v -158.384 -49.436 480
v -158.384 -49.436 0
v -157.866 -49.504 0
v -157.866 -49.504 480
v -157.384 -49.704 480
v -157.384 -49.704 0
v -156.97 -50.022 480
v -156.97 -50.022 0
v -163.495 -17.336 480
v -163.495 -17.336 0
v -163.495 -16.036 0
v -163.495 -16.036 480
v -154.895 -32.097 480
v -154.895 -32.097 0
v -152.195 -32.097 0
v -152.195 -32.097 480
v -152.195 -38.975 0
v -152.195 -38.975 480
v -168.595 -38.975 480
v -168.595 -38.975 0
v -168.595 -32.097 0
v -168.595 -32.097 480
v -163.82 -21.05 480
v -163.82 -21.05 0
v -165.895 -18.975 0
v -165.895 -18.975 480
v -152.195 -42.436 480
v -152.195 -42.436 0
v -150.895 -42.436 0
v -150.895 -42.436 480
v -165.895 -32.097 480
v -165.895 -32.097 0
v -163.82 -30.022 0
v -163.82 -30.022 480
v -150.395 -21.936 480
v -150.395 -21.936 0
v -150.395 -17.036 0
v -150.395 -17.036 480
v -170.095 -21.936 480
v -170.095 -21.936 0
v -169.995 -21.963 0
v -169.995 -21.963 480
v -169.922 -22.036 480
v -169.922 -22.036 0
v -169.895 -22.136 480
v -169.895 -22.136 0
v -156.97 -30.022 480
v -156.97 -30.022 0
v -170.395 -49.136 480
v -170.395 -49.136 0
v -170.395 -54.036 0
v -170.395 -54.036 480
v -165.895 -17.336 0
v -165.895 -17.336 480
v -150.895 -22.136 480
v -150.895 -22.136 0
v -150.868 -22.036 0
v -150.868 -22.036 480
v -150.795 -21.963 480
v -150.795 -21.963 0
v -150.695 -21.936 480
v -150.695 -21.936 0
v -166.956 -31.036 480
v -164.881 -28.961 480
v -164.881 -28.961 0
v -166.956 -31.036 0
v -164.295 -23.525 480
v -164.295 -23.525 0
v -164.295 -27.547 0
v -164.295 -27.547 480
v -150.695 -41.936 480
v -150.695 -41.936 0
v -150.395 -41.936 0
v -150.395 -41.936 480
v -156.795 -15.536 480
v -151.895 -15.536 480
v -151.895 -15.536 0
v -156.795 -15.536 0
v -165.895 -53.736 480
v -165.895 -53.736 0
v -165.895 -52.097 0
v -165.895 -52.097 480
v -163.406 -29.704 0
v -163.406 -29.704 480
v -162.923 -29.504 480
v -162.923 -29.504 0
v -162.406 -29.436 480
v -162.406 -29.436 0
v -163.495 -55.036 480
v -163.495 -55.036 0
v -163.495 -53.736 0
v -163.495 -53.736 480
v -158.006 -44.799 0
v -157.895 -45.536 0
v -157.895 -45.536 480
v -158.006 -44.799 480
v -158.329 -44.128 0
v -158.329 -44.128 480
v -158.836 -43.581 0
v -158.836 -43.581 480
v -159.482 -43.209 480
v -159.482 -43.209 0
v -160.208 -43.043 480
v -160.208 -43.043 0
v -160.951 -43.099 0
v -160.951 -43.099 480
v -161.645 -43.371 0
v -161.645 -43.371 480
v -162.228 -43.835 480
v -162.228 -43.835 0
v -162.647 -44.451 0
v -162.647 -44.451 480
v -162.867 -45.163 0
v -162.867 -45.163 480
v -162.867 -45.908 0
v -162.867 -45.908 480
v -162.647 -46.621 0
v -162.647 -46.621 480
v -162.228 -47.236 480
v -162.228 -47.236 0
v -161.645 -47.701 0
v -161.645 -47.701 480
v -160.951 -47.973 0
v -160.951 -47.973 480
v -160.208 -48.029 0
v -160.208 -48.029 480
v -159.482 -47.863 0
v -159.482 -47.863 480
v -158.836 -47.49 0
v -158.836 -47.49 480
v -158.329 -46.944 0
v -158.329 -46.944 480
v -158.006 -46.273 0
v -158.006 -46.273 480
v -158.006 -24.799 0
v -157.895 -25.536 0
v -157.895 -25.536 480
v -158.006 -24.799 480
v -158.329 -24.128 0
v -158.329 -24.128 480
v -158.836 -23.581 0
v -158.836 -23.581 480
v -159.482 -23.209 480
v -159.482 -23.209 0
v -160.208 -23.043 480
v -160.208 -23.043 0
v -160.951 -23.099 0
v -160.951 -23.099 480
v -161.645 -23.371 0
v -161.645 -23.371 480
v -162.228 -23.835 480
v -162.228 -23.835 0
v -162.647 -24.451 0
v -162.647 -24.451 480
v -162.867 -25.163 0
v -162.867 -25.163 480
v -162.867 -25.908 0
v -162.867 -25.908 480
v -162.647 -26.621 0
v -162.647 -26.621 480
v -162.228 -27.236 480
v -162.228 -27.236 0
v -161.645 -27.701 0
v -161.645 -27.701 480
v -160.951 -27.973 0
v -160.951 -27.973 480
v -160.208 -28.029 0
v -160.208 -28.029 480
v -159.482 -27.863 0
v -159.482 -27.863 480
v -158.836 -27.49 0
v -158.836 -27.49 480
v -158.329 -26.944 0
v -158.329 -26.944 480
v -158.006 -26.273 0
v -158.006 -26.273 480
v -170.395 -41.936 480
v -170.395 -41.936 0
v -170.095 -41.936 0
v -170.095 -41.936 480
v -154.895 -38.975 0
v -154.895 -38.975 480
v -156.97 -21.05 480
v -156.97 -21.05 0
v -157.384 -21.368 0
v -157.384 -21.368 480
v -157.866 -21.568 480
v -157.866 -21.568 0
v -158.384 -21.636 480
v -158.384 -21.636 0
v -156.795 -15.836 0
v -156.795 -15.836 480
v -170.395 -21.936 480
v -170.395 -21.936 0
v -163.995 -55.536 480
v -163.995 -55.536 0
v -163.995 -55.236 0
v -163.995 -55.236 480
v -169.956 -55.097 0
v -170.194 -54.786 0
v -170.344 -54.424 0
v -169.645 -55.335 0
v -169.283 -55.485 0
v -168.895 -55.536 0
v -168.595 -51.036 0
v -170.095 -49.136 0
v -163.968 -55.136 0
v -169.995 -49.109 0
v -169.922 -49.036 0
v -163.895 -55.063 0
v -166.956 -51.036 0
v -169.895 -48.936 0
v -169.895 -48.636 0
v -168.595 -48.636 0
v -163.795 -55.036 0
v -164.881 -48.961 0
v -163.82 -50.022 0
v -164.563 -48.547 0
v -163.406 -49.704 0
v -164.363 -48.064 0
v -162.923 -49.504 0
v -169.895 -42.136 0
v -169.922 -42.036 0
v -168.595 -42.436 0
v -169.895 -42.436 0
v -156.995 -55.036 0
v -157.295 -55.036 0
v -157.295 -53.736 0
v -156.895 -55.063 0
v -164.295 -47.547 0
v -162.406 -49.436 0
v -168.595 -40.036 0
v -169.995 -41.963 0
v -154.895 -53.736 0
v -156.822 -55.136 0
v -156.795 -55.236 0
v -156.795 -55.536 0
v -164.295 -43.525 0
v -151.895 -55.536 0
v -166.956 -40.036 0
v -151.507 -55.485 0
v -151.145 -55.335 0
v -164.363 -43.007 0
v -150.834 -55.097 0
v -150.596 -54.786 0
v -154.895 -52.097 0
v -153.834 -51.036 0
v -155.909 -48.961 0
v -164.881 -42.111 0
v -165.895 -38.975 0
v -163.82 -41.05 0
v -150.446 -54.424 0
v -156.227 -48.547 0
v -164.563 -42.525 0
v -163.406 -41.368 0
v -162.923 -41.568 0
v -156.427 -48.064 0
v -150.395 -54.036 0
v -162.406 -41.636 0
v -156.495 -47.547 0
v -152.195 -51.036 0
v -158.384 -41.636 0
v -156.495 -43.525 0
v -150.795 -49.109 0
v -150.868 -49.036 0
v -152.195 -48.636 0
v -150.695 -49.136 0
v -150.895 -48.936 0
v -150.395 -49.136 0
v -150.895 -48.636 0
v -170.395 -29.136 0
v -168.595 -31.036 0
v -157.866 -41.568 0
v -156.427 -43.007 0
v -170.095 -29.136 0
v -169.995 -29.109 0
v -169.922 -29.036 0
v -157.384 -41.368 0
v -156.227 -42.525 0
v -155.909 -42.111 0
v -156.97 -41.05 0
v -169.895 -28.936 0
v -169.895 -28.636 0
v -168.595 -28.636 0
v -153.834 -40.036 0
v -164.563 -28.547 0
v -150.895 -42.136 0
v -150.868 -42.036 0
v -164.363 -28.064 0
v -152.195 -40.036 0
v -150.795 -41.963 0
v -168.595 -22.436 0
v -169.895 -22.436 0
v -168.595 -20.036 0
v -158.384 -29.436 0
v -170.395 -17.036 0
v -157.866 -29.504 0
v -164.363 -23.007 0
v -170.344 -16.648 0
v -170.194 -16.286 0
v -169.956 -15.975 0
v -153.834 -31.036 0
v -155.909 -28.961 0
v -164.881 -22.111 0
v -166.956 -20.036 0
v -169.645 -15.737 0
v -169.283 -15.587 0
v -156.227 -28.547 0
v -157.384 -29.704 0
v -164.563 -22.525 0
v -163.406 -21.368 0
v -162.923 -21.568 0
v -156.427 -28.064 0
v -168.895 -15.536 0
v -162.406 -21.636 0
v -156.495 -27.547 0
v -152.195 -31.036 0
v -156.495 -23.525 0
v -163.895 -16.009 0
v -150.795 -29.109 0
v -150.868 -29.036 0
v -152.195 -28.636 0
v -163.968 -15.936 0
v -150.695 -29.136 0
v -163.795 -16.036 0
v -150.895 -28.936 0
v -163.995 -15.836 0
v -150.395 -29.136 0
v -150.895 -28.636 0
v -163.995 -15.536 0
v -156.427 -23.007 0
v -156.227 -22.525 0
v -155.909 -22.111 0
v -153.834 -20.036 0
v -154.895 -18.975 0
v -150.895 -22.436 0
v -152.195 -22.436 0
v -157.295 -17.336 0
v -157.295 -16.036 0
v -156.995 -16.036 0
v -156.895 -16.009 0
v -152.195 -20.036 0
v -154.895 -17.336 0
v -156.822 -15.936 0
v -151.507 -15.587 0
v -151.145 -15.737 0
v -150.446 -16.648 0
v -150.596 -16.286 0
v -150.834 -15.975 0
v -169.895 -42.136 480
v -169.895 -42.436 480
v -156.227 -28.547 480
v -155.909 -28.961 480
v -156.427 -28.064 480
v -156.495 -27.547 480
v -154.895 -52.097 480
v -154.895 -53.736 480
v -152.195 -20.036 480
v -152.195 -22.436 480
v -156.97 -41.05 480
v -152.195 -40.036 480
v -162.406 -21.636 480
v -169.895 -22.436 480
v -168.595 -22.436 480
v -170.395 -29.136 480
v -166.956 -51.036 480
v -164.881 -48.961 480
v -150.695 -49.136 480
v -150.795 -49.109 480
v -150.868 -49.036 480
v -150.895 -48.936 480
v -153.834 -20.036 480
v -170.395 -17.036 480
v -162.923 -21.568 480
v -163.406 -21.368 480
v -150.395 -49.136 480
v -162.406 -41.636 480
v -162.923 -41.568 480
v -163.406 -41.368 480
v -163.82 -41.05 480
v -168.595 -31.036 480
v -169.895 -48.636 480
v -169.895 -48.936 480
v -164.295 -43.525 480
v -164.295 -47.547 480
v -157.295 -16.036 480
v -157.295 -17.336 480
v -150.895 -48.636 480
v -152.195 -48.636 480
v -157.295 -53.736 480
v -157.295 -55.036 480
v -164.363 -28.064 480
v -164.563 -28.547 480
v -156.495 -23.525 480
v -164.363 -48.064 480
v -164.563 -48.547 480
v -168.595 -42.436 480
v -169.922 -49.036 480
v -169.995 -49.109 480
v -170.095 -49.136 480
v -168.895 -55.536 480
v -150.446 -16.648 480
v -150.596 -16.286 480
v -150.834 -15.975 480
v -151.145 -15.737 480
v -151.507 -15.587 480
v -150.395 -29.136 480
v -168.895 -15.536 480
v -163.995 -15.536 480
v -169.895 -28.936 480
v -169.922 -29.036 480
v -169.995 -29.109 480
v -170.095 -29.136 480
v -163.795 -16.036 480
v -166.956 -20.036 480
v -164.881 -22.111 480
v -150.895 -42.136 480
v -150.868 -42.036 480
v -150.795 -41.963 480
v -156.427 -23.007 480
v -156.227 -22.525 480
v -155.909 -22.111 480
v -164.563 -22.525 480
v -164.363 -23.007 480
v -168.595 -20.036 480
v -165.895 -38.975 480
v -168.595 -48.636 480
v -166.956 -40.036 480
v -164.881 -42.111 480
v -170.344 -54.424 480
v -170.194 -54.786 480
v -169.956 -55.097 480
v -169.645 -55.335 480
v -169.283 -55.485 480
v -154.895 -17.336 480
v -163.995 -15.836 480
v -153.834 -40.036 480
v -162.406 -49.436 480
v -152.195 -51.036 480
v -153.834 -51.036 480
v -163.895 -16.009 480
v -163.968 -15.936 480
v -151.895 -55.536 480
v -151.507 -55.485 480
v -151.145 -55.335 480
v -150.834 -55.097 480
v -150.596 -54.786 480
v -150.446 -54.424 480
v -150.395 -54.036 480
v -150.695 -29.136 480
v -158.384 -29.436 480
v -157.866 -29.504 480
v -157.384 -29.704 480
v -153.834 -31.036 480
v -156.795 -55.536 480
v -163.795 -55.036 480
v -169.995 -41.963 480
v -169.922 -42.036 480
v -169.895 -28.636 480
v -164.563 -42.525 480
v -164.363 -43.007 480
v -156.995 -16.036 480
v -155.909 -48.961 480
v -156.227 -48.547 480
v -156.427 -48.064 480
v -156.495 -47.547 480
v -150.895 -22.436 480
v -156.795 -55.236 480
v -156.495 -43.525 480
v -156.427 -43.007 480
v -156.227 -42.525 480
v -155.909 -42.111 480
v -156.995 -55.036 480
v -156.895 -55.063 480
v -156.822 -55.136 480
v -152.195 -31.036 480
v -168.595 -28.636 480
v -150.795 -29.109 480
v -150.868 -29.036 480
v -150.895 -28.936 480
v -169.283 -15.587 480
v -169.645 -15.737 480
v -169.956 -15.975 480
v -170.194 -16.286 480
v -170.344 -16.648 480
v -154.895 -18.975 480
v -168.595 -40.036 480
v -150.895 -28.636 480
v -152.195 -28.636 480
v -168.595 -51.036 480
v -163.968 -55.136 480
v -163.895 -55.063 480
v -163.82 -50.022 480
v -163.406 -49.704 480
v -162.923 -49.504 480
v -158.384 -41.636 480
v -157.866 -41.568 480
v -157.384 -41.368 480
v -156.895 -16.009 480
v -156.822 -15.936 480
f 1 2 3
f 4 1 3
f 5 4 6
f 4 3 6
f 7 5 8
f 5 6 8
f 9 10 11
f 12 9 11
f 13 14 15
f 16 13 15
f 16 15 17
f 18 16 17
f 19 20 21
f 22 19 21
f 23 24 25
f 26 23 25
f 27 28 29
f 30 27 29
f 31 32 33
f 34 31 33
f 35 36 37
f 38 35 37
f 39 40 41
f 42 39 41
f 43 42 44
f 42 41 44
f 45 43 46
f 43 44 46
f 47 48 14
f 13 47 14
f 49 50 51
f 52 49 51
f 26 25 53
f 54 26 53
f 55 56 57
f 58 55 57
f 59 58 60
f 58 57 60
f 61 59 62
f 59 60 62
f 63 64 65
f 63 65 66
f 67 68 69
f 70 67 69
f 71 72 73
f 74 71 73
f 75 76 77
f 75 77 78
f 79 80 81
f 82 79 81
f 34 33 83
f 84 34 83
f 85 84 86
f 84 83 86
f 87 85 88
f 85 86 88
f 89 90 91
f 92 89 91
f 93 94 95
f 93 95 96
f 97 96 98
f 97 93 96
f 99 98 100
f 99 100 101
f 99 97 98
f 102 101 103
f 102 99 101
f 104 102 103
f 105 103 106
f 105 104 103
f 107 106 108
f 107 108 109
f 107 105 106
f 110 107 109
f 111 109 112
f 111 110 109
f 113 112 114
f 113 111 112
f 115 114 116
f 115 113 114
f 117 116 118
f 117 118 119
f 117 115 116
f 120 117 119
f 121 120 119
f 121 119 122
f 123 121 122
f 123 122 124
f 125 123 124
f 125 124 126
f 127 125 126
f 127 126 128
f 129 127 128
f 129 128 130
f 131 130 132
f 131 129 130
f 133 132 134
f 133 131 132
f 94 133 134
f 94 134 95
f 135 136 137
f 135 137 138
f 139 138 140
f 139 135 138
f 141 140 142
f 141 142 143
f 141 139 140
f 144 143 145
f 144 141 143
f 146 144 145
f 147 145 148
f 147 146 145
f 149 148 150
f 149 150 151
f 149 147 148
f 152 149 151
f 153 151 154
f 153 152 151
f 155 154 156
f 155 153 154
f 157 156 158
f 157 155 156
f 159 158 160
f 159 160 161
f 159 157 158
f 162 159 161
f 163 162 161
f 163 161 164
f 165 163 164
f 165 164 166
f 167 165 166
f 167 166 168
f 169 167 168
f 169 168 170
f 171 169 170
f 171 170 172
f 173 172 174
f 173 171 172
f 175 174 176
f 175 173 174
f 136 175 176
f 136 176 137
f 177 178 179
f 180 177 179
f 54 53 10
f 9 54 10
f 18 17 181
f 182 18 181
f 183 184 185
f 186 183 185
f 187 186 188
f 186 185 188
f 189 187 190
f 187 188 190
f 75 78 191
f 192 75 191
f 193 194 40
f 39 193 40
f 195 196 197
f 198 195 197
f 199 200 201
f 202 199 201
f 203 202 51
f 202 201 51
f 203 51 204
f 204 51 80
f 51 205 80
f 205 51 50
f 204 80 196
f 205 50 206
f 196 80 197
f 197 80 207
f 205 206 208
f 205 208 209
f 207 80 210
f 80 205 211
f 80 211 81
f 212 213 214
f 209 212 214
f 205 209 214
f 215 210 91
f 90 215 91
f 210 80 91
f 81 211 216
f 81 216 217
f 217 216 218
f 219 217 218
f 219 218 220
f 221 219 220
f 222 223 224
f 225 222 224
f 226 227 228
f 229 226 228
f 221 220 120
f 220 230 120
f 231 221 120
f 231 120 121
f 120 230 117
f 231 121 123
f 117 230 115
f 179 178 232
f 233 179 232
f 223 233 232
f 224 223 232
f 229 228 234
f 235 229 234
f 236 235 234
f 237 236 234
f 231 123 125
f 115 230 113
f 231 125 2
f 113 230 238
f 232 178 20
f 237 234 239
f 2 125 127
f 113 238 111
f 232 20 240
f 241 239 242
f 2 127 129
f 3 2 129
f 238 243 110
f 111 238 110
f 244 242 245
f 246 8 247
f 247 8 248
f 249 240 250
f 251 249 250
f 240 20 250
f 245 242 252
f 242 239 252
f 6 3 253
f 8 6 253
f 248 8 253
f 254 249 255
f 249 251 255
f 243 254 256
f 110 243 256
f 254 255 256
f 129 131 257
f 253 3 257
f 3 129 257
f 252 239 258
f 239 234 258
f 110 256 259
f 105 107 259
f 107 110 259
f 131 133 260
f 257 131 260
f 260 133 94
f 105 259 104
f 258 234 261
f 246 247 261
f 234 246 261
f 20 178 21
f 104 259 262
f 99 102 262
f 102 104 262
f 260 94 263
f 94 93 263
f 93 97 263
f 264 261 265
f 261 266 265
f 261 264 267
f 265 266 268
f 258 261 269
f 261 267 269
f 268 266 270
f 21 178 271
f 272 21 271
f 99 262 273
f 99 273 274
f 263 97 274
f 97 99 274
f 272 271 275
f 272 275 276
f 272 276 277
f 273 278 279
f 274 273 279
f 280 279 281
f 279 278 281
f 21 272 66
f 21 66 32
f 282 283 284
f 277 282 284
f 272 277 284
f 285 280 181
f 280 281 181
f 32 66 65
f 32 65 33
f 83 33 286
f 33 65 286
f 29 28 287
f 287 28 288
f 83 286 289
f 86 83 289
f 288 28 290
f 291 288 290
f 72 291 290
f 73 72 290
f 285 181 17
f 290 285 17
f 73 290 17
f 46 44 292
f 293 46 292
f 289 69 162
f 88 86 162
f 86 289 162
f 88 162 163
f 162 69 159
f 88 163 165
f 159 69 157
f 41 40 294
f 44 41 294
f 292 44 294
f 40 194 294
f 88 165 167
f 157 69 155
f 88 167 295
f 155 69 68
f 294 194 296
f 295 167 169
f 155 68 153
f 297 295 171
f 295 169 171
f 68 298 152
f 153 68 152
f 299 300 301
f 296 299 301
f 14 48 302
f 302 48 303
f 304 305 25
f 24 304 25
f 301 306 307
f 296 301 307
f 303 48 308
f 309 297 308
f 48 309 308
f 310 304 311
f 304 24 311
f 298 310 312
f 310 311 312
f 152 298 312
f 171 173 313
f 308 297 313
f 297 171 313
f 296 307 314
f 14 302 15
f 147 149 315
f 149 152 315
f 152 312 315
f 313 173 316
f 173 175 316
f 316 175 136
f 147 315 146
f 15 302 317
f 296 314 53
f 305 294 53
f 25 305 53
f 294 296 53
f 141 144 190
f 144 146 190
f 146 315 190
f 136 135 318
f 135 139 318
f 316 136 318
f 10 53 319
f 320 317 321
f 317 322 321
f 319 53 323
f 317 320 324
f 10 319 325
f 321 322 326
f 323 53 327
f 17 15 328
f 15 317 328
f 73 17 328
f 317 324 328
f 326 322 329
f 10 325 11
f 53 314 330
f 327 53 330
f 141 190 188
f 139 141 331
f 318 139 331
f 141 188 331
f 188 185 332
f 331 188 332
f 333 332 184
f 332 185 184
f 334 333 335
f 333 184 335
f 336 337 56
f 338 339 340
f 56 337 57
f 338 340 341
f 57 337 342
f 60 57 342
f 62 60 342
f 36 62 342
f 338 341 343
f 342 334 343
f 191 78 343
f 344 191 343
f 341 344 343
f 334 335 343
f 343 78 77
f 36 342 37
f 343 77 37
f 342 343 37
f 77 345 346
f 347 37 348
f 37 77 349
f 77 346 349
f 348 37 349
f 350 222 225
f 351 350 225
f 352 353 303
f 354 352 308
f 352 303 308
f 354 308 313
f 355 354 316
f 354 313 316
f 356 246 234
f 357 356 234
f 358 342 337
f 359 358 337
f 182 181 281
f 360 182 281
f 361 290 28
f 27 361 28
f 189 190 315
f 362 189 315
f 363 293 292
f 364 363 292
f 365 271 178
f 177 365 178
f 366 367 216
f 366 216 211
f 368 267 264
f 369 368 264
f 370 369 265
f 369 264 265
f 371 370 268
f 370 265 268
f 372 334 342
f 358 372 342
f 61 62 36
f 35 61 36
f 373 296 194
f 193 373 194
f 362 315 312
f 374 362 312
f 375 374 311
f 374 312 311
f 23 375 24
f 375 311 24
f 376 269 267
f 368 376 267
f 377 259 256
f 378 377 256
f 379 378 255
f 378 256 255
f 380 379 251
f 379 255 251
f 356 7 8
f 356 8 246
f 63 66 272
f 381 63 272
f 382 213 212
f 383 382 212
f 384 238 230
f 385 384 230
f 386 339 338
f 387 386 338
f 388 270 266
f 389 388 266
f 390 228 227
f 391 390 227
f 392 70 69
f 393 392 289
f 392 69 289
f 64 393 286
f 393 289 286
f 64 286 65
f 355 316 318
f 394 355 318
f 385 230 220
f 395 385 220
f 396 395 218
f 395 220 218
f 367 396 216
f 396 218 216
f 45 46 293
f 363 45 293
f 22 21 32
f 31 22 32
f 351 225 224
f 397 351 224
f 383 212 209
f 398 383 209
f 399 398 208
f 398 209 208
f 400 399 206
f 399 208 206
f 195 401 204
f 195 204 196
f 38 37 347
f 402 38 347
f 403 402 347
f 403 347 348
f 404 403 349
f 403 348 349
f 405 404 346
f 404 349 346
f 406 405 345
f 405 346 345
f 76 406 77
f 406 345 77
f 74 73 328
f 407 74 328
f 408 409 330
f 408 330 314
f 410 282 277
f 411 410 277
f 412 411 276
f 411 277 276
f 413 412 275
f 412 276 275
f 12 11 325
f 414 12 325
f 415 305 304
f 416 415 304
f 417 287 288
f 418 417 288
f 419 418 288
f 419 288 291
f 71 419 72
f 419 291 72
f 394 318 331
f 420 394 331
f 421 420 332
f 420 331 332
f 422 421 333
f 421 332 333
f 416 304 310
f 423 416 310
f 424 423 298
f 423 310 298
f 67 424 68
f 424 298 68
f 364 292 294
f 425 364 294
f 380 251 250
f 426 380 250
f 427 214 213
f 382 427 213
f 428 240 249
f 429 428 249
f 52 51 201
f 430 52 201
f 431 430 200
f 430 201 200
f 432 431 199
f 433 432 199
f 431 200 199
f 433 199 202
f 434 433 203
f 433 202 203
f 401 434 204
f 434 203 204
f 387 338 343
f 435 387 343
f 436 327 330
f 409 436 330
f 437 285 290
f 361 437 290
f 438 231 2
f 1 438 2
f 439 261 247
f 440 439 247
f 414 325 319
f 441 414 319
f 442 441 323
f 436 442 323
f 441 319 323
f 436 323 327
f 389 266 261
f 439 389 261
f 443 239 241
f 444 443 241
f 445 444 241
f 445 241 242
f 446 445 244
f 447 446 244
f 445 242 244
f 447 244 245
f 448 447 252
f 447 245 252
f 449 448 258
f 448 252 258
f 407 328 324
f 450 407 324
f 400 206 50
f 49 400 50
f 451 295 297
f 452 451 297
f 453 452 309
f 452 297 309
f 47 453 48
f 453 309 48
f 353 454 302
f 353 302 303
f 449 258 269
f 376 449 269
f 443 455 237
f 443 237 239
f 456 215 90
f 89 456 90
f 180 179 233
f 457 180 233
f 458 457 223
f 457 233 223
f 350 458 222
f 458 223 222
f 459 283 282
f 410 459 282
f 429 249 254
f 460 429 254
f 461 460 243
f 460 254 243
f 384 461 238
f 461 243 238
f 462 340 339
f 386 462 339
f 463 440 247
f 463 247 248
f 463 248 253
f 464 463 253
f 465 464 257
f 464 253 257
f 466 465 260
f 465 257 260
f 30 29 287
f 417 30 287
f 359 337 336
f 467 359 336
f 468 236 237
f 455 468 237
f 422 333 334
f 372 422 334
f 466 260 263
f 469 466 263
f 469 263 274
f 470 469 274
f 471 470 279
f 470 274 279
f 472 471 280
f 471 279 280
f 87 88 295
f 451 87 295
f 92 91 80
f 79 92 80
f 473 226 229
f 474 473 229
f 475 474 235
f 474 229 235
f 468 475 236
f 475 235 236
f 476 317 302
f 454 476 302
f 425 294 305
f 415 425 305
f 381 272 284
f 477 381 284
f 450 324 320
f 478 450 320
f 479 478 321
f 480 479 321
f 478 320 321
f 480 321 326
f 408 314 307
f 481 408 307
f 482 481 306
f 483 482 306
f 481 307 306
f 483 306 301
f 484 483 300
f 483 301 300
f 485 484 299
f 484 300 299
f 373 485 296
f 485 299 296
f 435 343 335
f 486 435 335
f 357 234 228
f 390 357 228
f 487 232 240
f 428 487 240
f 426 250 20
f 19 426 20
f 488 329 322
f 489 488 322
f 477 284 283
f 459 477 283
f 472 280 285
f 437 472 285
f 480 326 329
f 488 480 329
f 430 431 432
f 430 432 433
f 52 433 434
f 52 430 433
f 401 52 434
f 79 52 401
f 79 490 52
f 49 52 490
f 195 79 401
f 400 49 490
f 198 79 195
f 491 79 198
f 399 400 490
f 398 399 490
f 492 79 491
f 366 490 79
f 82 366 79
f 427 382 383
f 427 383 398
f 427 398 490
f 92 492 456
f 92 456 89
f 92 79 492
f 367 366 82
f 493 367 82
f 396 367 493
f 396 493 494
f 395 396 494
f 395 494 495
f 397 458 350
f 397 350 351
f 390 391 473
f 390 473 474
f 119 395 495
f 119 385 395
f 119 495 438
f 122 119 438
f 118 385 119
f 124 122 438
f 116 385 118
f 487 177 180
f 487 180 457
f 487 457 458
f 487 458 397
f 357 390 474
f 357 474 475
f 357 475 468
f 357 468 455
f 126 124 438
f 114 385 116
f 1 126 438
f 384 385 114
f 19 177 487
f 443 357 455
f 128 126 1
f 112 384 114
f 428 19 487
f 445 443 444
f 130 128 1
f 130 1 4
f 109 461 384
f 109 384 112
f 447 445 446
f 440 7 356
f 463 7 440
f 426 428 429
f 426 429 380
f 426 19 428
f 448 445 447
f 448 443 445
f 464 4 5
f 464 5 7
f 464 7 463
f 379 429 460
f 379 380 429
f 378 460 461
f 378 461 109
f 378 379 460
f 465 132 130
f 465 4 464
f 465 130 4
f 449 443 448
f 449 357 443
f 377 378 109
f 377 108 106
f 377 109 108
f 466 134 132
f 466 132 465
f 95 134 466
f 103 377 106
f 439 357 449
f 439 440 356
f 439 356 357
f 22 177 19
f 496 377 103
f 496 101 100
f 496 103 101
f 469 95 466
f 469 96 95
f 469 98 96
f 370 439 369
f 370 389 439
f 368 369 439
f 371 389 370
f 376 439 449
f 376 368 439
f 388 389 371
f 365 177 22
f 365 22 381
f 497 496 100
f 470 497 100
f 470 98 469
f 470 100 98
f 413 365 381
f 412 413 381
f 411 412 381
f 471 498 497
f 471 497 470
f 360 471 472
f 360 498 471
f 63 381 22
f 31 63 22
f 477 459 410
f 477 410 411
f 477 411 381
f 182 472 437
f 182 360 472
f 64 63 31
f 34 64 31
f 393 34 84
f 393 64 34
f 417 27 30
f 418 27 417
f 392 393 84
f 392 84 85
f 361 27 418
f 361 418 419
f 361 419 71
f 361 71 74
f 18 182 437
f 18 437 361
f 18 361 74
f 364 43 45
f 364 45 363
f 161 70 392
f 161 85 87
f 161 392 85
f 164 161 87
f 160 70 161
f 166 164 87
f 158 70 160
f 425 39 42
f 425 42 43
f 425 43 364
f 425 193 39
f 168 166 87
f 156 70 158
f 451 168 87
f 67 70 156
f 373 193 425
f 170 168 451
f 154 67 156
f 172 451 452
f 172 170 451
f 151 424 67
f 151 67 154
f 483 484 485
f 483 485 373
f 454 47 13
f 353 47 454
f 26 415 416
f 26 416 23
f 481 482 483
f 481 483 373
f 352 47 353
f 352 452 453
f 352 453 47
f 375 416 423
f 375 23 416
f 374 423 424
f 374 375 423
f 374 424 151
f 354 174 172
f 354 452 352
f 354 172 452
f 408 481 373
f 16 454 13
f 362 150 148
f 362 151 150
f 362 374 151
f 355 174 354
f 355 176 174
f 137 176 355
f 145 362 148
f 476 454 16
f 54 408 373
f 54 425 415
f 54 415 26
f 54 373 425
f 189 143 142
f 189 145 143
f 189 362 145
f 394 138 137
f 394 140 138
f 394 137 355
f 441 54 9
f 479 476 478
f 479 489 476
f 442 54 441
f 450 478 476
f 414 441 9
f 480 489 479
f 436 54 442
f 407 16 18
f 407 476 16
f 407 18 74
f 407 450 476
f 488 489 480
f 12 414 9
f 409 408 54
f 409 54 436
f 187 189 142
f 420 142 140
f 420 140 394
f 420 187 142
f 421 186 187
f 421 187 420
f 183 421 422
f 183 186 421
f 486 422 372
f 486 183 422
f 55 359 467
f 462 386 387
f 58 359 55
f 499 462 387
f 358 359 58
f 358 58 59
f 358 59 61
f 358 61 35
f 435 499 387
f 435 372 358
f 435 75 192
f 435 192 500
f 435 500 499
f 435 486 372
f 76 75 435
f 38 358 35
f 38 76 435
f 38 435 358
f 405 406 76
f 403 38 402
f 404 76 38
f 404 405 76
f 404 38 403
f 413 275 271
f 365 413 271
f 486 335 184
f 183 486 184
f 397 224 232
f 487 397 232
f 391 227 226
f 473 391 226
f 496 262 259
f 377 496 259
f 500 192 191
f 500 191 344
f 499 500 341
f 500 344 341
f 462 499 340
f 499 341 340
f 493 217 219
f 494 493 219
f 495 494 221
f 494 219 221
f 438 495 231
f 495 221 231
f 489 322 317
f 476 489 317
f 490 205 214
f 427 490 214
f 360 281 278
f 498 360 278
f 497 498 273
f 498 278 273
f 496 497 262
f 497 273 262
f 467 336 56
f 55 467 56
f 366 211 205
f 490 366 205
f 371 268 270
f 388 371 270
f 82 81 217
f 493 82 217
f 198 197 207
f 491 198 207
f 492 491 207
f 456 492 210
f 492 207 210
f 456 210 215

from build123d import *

# Parameters (mm, degrees)
F0_R     = 2.5
F1_DEPTH = 480


with BuildPart() as f1:
    # F0 (on Top) → F1 (new body)
    with BuildSketch(Plane.XY):
        with BuildLine():
            Line((-154.894894, -55.535871), (-151.894894, -55.535871))
            ThreePointArc((-151.894894, -55.535871), (-150.834234, -55.096531), (-150.394894, -54.035871))
            Line((-150.394894, -54.035871), (-150.394894, -51.035871))
            Line((-150.394894, -51.035871), (-150.394894, -49.135871))
            Line((-150.394894, -49.135871), (-150.694894, -49.135871))
            ThreePointArc((-150.694894, -49.135871), (-150.836316, -49.077292), (-150.894894, -48.935871))
            Line((-150.894894, -48.935871), (-150.894894, -48.635871))
            Line((-150.894894, -48.635871), (-152.194894, -48.635871))
            Line((-152.194894, -48.635871), (-152.194894, -51.035871))
            Line((-152.194894, -51.035871), (-153.834234, -51.035871))
            Line((-153.834234, -51.035871), (-155.909108, -48.960997))
            ThreePointArc((-155.909108, -48.960997), (-156.342654, -48.31215), (-156.494894, -47.546783))
            Line((-156.494894, -47.546783), (-156.494894, -43.524958))
            ThreePointArc((-156.494894, -43.524958), (-156.342654, -42.759591), (-155.909108, -42.110744))
            Line((-155.909108, -42.110744), (-153.834234, -40.035871))
            Line((-153.834234, -40.035871), (-152.194894, -40.035871))
            Line((-152.194894, -40.035871), (-152.194894, -42.435871))
            Line((-152.194894, -42.435871), (-150.894894, -42.435871))
            Line((-150.894894, -42.435871), (-150.894894, -42.135871))
            ThreePointArc((-150.894894, -42.135871), (-150.836316, -41.994449), (-150.694894, -41.935871))
            Line((-150.694894, -41.935871), (-150.394894, -41.935871))
            Line((-150.394894, -41.935871), (-150.394894, -40.035871))
            Line((-150.394894, -40.035871), (-150.394894, -37.035871))
            Line((-150.394894, -37.035871), (-150.394894, -35.535871))
            Line((-150.394894, -35.535871), (-150.394894, -34.035871))
            Line((-150.394894, -34.035871), (-150.394894, -31.035871))
            Line((-150.394894, -31.035871), (-150.394894, -29.135871))
            Line((-150.394894, -29.135871), (-150.694894, -29.135871))
            ThreePointArc((-150.694894, -29.135871), (-150.836316, -29.077292), (-150.894894, -28.935871))
            Line((-150.894894, -28.935871), (-150.894894, -28.635871))
            Line((-150.894894, -28.635871), (-152.194894, -28.635871))
            Line((-152.194894, -28.635871), (-152.194894, -31.035871))
            Line((-152.194894, -31.035871), (-153.834234, -31.035871))
            Line((-153.834234, -31.035871), (-155.909108, -28.960997))
            ThreePointArc((-155.909108, -28.960997), (-156.342654, -28.31215), (-156.494894, -27.546783))
            Line((-156.494894, -27.546783), (-156.494894, -23.524958))
            ThreePointArc((-156.494894, -23.524958), (-156.342654, -22.759591), (-155.909108, -22.110744))
            Line((-155.909108, -22.110744), (-153.834234, -20.035871))
            Line((-153.834234, -20.035871), (-152.194894, -20.035871))
            Line((-152.194894, -20.035871), (-152.194894, -22.435871))
            Line((-152.194894, -22.435871), (-150.894894, -22.435871))
            Line((-150.894894, -22.435871), (-150.894894, -22.135871))
            ThreePointArc((-150.894894, -22.135871), (-150.836316, -21.994449), (-150.694894, -21.935871))
            Line((-150.694894, -21.935871), (-150.394894, -21.935871))
            Line((-150.394894, -21.935871), (-150.394894, -20.035871))
            Line((-150.394894, -20.035871), (-150.394894, -17.035871))
            ThreePointArc((-150.394894, -17.035871), (-150.834234, -15.975211), (-151.894894, -15.535871))
            Line((-151.894894, -15.535871), (-154.894894, -15.535871))
            Line((-154.894894, -15.535871), (-156.294894, -15.535871))
            Line((-156.294894, -15.535871), (-156.794894, -15.535871))
            Line((-156.794894, -15.535871), (-156.794894, -15.835871))
            ThreePointArc((-156.794894, -15.835871), (-156.853473, -15.977292), (-156.994894, -16.035871))
            Line((-156.994894, -16.035871), (-157.294894, -16.035871))
            Line((-157.294894, -16.035871), (-157.294894, -17.335871))
            Line((-157.294894, -17.335871), (-154.894894, -17.335871))
            Line((-154.894894, -17.335871), (-154.894894, -18.975211))
            Line((-154.894894, -18.975211), (-156.969768, -21.050084))
            ThreePointArc((-156.969768, -21.050084), (-157.618615, -21.48363), (-158.383982, -21.635871))
            Line((-158.383982, -21.635871), (-162.405807, -21.635871))
            ThreePointArc((-162.405807, -21.635871), (-163.171174, -21.48363), (-163.820021, -21.050084))
            Line((-163.820021, -21.050084), (-165.894894, -18.975211))
            Line((-165.894894, -18.975211), (-165.894894, -17.335871))
            Line((-165.894894, -17.335871), (-163.494894, -17.335871))
            Line((-163.494894, -17.335871), (-163.494894, -16.035871))
            Line((-163.494894, -16.035871), (-163.794894, -16.035871))
            ThreePointArc((-163.794894, -16.035871), (-163.936316, -15.977292), (-163.994894, -15.835871))
            Line((-163.994894, -15.835871), (-163.994894, -15.535871))
            Line((-163.994894, -15.535871), (-164.494894, -15.535871))
            Line((-164.494894, -15.535871), (-165.894894, -15.535871))
            Line((-165.894894, -15.535871), (-168.894894, -15.535871))
            ThreePointArc((-168.894894, -15.535871), (-169.955555, -15.975211), (-170.394894, -17.035871))
            Line((-170.394894, -17.035871), (-170.394894, -20.035871))
            Line((-170.394894, -20.035871), (-170.394894, -21.935871))
            Line((-170.394894, -21.935871), (-170.094894, -21.935871))
            ThreePointArc((-170.094894, -21.935871), (-169.953473, -21.994449), (-169.894894, -22.135871))
            Line((-169.894894, -22.135871), (-169.894894, -22.435871))
            Line((-169.894894, -22.435871), (-168.594894, -22.435871))
            Line((-168.594894, -22.435871), (-168.594894, -20.035871))
            Line((-168.594894, -20.035871), (-166.955555, -20.035871))
            Line((-166.955555, -20.035871), (-164.880681, -22.110744))
            ThreePointArc((-164.880681, -22.110744), (-164.447135, -22.759591), (-164.294894, -23.524958))
            Line((-164.294894, -23.524958), (-164.294894, -27.546783))
            ThreePointArc((-164.294894, -27.546783), (-164.447135, -28.31215), (-164.880681, -28.960997))
            Line((-164.880681, -28.960997), (-166.955555, -31.035871))
            Line((-166.955555, -31.035871), (-168.594894, -31.035871))
            Line((-168.594894, -31.035871), (-168.594894, -28.635871))
            Line((-168.594894, -28.635871), (-169.894894, -28.635871))
            Line((-169.894894, -28.635871), (-169.894894, -28.935871))
            ThreePointArc((-169.894894, -28.935871), (-169.953473, -29.077292), (-170.094894, -29.135871))
            Line((-170.094894, -29.135871), (-170.394894, -29.135871))
            Line((-170.394894, -29.135871), (-170.394894, -31.035871))
            Line((-170.394894, -31.035871), (-170.394894, -34.035871))
            Line((-170.394894, -34.035871), (-170.394894, -35.535871))
            Line((-170.394894, -35.535871), (-170.394894, -37.035871))
            Line((-170.394894, -37.035871), (-170.394894, -40.035871))
            Line((-170.394894, -40.035871), (-170.394894, -41.935871))
            Line((-170.394894, -41.935871), (-170.094894, -41.935871))
            ThreePointArc((-170.094894, -41.935871), (-169.953473, -41.994449), (-169.894894, -42.135871))
            Line((-169.894894, -42.135871), (-169.894894, -42.435871))
            Line((-169.894894, -42.435871), (-168.594894, -42.435871))
            Line((-168.594894, -42.435871), (-168.594894, -40.035871))
            Line((-168.594894, -40.035871), (-166.955555, -40.035871))
            Line((-166.955555, -40.035871), (-164.880681, -42.110744))
            ThreePointArc((-164.880681, -42.110744), (-164.447135, -42.759591), (-164.294894, -43.524958))
            Line((-164.294894, -43.524958), (-164.294894, -47.546783))
            ThreePointArc((-164.294894, -47.546783), (-164.447135, -48.31215), (-164.880681, -48.960997))
            Line((-164.880681, -48.960997), (-166.955555, -51.035871))
            Line((-166.955555, -51.035871), (-168.594894, -51.035871))
            Line((-168.594894, -51.035871), (-168.594894, -48.635871))
            Line((-168.594894, -48.635871), (-169.894894, -48.635871))
            Line((-169.894894, -48.635871), (-169.894894, -48.935871))
            ThreePointArc((-169.894894, -48.935871), (-169.953473, -49.077292), (-170.094894, -49.135871))
            Line((-170.094894, -49.135871), (-170.394894, -49.135871))
            Line((-170.394894, -49.135871), (-170.394894, -51.035871))
            Line((-170.394894, -51.035871), (-170.394894, -54.035871))
            ThreePointArc((-170.394894, -54.035871), (-169.955555, -55.096531), (-168.894894, -55.535871))
            Line((-168.894894, -55.535871), (-165.894894, -55.535871))
            Line((-165.894894, -55.535871), (-164.494894, -55.535871))
            Line((-164.494894, -55.535871), (-163.994894, -55.535871))
            Line((-163.994894, -55.535871), (-163.994894, -55.235871))
            ThreePointArc((-163.994894, -55.235871), (-163.936316, -55.094449), (-163.794894, -55.035871))
            Line((-163.794894, -55.035871), (-163.494894, -55.035871))
            Line((-163.494894, -55.035871), (-163.494894, -53.735871))
            Line((-163.494894, -53.735871), (-165.894894, -53.735871))
            Line((-165.894894, -53.735871), (-165.894894, -52.096531))
            Line((-165.894894, -52.096531), (-163.820021, -50.021657))
            ThreePointArc((-163.820021, -50.021657), (-163.171174, -49.588112), (-162.405807, -49.435871))
            Line((-162.405807, -49.435871), (-158.383982, -49.435871))
            ThreePointArc((-158.383982, -49.435871), (-157.618615, -49.588112), (-156.969768, -50.021657))
            Line((-156.969768, -50.021657), (-154.894894, -52.096531))
            Line((-154.894894, -52.096531), (-154.894894, -53.735871))
            Line((-154.894894, -53.735871), (-157.294894, -53.735871))
            Line((-157.294894, -53.735871), (-157.294894, -55.035871))
            Line((-157.294894, -55.035871), (-156.994894, -55.035871))
            ThreePointArc((-156.994894, -55.035871), (-156.853473, -55.094449), (-156.794894, -55.235871))
            Line((-156.794894, -55.235871), (-156.794894, -55.535871))
            Line((-156.794894, -55.535871), (-156.294894, -55.535871))
            Line((-156.294894, -55.535871), (-154.894894, -55.535871))
        make_face()
        with Locations((-160.394894, -45.535871)):
            Circle(F0_R, mode=Mode.SUBTRACT)
        with BuildLine():
            ThreePointArc((-156.969768, -41.050084), (-157.618615, -41.48363), (-158.383982, -41.635871))
            Line((-158.383982, -41.635871), (-162.405807, -41.635871))
            ThreePointArc((-162.405807, -41.635871), (-163.171174, -41.48363), (-163.820021, -41.050084))
            Line((-163.820021, -41.050084), (-165.894894, -38.975211))
            Line((-165.894894, -38.975211), (-168.594894, -38.975211))
            Line((-168.594894, -38.975211), (-168.594894, -35.535871))
            Line((-168.594894, -35.535871), (-168.594894, -32.096531))
            Line((-168.594894, -32.096531), (-165.894894, -32.096531))
            Line((-165.894894, -32.096531), (-163.820021, -30.021657))
            ThreePointArc((-163.820021, -30.021657), (-163.171174, -29.588112), (-162.405807, -29.435871))
            Line((-162.405807, -29.435871), (-158.383982, -29.435871))
            ThreePointArc((-158.383982, -29.435871), (-157.618615, -29.588112), (-156.969768, -30.021657))
            Line((-156.969768, -30.021657), (-154.894894, -32.096531))
            Line((-154.894894, -32.096531), (-152.194894, -32.096531))
            Line((-152.194894, -32.096531), (-152.194894, -35.535871))
            Line((-152.194894, -35.535871), (-152.194894, -38.975211))
            Line((-152.194894, -38.975211), (-154.894894, -38.975211))
            Line((-154.894894, -38.975211), (-156.969768, -41.050084))
        make_face(mode=Mode.SUBTRACT)
        with Locations((-160.394894, -25.535871)):
            Circle(F0_R, mode=Mode.SUBTRACT)
    extrude(amount=F1_DEPTH)


solid = f1.part
